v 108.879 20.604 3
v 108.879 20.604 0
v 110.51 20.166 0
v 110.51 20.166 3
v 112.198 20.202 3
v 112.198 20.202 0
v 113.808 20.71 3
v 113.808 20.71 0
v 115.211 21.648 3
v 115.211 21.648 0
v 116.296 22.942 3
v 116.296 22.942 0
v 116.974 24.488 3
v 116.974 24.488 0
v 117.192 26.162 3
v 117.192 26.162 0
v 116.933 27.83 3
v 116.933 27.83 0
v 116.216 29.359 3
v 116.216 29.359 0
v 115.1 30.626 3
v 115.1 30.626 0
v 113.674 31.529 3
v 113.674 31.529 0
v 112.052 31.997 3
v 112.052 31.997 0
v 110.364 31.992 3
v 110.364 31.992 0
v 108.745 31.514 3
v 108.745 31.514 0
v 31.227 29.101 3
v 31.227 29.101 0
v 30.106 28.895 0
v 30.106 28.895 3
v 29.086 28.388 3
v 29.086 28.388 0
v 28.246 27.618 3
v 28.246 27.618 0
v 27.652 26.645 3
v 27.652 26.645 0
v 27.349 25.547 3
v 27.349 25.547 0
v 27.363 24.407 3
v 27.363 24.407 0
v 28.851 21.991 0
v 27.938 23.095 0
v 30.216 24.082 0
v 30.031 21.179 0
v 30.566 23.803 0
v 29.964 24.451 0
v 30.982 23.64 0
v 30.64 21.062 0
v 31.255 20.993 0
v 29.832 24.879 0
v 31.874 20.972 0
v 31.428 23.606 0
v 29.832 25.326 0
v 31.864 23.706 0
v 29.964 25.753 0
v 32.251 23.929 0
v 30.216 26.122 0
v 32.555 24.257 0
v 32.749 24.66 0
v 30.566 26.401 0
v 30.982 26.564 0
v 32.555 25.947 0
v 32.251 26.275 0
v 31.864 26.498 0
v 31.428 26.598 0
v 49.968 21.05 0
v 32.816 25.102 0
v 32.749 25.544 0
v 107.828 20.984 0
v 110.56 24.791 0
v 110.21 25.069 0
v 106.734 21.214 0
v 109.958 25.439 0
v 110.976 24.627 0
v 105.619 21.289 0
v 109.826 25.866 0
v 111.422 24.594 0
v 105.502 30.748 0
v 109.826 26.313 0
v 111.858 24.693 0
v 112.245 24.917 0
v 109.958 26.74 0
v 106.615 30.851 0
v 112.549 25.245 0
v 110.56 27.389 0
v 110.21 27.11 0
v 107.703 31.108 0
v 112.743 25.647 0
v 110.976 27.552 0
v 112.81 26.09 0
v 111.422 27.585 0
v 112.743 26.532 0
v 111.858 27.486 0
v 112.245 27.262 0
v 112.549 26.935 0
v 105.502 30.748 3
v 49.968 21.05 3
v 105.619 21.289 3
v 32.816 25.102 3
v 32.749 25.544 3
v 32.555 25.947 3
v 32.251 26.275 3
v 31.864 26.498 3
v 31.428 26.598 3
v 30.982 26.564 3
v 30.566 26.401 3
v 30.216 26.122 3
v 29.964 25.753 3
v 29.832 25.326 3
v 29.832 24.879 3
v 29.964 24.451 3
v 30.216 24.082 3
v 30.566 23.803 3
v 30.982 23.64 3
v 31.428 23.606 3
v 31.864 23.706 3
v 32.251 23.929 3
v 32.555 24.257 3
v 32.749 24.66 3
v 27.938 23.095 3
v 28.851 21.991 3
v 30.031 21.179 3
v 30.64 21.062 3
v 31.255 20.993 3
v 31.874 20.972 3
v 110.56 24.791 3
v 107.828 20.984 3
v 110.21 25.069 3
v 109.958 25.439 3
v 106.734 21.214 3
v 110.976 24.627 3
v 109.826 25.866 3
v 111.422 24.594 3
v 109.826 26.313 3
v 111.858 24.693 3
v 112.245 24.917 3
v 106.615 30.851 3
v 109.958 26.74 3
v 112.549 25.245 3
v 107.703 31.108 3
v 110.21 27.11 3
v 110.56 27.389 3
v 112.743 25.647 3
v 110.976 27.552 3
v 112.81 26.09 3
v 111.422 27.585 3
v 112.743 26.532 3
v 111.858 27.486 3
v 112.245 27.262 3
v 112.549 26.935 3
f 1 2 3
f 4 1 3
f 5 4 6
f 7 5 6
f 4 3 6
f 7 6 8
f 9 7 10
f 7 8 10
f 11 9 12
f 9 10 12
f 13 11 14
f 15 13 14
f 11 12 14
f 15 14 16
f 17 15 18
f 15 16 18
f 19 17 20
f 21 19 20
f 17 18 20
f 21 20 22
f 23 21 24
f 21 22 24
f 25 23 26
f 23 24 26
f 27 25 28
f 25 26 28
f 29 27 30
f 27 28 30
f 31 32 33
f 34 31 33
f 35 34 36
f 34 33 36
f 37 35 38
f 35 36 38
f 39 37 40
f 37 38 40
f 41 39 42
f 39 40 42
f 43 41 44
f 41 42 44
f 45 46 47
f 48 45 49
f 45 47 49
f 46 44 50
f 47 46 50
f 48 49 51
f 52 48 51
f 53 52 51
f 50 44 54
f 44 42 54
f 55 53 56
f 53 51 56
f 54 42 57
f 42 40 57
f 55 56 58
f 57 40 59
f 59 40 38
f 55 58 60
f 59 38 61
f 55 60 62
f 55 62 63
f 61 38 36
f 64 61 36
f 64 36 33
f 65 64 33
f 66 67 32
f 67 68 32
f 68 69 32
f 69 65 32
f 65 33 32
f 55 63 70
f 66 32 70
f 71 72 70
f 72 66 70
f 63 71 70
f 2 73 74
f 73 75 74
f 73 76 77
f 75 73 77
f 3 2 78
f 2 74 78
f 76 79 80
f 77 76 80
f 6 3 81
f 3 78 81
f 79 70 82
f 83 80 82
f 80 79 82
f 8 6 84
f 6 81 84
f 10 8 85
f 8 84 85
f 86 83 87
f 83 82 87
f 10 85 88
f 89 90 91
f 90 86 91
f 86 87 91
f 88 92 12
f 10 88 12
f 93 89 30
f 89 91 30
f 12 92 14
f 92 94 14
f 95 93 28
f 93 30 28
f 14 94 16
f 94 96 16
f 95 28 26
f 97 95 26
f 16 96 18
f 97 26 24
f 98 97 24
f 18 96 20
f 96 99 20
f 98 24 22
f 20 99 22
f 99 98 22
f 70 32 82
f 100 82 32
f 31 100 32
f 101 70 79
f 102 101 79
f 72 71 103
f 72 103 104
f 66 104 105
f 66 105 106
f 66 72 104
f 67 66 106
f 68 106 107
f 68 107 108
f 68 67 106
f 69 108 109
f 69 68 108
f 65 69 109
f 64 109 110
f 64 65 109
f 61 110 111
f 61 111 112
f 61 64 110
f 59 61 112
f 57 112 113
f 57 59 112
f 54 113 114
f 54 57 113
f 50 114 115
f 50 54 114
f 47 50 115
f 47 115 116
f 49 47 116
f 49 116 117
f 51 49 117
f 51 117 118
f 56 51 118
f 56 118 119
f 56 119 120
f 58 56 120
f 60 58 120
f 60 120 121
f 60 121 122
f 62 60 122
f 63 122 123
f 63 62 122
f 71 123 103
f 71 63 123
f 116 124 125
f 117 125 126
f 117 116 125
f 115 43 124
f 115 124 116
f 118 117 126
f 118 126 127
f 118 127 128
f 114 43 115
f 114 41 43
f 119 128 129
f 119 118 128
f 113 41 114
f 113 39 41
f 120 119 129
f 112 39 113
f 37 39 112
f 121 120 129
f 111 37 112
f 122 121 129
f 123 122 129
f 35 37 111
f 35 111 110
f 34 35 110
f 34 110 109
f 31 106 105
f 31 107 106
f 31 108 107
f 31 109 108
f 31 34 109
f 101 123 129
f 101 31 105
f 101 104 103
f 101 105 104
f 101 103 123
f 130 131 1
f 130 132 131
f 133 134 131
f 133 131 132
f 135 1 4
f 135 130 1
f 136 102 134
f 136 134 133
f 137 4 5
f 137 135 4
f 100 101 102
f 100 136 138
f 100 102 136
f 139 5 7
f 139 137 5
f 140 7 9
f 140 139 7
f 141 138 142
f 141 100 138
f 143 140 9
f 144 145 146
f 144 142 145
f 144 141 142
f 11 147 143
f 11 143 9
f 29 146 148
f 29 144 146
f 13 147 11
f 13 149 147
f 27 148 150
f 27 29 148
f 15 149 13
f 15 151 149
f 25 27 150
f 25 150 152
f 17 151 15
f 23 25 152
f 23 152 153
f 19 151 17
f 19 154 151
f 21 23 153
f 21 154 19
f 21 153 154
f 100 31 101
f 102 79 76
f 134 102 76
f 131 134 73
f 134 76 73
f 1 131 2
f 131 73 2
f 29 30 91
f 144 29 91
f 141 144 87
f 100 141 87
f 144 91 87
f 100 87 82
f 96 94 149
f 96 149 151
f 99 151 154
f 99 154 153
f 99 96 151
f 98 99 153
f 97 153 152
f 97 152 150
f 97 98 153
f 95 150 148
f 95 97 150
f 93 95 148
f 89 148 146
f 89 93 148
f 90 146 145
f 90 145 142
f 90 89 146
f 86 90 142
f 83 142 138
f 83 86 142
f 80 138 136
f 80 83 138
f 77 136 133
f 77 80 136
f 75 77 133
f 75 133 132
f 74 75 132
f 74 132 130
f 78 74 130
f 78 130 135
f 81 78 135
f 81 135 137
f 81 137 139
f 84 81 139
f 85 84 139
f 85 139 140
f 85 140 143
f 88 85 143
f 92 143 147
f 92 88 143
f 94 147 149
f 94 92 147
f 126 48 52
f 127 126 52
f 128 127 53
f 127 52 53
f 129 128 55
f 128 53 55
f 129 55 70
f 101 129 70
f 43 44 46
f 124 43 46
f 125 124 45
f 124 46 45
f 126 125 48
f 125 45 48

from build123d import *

# Parameters (mm, degrees)
MODEL_R             = 1.5
BOSS_EXTRUDE1_DEPTH = 3


with BuildPart() as part:
    # Model → Boss-Extrude1 (new body)
    with BuildSketch(Plane.XY):
        with BuildLine():
            Line((49.968489673, 21.049962128), (105.618768597, 21.289392046))
            ThreePointArc((105.618768597, 21.289392046), (107.285112204, 21.118249382), (108.87926509, 20.60379102))
            ThreePointArc((108.87926509, 20.60379102), (117.192196904, 26.162159278), (108.74462654, 31.51368691))
            ThreePointArc((108.74462654, 31.51368691), (107.163632348, 30.960034557), (105.502006567, 30.747729758))
            Line((105.502006567, 30.747729758), (31.227056592, 29.101105192))
            ThreePointArc((31.227056592, 29.101105192), (28.246037105, 27.617586299), (27.362873685, 24.407083556))
            ThreePointArc((27.362873685, 24.407083556), (28.356080114, 22.511229951), (30.031202973, 21.179057549))
            ThreePointArc((30.031202973, 21.179057549), (30.946620491, 21.021963969), (31.874075806, 20.972021358))
            Line((31.874075806, 20.972021358), (49.968489673, 21.049962128))
        make_face()
        with Locations((31.31571206, 25.102087789)):
            Circle(MODEL_R, mode=Mode.SUBTRACT)
        with Locations((111.309575273, 26.089603674)):
            Circle(MODEL_R, mode=Mode.SUBTRACT)
    extrude(amount=BOSS_EXTRUDE1_DEPTH)


solid = part.part
